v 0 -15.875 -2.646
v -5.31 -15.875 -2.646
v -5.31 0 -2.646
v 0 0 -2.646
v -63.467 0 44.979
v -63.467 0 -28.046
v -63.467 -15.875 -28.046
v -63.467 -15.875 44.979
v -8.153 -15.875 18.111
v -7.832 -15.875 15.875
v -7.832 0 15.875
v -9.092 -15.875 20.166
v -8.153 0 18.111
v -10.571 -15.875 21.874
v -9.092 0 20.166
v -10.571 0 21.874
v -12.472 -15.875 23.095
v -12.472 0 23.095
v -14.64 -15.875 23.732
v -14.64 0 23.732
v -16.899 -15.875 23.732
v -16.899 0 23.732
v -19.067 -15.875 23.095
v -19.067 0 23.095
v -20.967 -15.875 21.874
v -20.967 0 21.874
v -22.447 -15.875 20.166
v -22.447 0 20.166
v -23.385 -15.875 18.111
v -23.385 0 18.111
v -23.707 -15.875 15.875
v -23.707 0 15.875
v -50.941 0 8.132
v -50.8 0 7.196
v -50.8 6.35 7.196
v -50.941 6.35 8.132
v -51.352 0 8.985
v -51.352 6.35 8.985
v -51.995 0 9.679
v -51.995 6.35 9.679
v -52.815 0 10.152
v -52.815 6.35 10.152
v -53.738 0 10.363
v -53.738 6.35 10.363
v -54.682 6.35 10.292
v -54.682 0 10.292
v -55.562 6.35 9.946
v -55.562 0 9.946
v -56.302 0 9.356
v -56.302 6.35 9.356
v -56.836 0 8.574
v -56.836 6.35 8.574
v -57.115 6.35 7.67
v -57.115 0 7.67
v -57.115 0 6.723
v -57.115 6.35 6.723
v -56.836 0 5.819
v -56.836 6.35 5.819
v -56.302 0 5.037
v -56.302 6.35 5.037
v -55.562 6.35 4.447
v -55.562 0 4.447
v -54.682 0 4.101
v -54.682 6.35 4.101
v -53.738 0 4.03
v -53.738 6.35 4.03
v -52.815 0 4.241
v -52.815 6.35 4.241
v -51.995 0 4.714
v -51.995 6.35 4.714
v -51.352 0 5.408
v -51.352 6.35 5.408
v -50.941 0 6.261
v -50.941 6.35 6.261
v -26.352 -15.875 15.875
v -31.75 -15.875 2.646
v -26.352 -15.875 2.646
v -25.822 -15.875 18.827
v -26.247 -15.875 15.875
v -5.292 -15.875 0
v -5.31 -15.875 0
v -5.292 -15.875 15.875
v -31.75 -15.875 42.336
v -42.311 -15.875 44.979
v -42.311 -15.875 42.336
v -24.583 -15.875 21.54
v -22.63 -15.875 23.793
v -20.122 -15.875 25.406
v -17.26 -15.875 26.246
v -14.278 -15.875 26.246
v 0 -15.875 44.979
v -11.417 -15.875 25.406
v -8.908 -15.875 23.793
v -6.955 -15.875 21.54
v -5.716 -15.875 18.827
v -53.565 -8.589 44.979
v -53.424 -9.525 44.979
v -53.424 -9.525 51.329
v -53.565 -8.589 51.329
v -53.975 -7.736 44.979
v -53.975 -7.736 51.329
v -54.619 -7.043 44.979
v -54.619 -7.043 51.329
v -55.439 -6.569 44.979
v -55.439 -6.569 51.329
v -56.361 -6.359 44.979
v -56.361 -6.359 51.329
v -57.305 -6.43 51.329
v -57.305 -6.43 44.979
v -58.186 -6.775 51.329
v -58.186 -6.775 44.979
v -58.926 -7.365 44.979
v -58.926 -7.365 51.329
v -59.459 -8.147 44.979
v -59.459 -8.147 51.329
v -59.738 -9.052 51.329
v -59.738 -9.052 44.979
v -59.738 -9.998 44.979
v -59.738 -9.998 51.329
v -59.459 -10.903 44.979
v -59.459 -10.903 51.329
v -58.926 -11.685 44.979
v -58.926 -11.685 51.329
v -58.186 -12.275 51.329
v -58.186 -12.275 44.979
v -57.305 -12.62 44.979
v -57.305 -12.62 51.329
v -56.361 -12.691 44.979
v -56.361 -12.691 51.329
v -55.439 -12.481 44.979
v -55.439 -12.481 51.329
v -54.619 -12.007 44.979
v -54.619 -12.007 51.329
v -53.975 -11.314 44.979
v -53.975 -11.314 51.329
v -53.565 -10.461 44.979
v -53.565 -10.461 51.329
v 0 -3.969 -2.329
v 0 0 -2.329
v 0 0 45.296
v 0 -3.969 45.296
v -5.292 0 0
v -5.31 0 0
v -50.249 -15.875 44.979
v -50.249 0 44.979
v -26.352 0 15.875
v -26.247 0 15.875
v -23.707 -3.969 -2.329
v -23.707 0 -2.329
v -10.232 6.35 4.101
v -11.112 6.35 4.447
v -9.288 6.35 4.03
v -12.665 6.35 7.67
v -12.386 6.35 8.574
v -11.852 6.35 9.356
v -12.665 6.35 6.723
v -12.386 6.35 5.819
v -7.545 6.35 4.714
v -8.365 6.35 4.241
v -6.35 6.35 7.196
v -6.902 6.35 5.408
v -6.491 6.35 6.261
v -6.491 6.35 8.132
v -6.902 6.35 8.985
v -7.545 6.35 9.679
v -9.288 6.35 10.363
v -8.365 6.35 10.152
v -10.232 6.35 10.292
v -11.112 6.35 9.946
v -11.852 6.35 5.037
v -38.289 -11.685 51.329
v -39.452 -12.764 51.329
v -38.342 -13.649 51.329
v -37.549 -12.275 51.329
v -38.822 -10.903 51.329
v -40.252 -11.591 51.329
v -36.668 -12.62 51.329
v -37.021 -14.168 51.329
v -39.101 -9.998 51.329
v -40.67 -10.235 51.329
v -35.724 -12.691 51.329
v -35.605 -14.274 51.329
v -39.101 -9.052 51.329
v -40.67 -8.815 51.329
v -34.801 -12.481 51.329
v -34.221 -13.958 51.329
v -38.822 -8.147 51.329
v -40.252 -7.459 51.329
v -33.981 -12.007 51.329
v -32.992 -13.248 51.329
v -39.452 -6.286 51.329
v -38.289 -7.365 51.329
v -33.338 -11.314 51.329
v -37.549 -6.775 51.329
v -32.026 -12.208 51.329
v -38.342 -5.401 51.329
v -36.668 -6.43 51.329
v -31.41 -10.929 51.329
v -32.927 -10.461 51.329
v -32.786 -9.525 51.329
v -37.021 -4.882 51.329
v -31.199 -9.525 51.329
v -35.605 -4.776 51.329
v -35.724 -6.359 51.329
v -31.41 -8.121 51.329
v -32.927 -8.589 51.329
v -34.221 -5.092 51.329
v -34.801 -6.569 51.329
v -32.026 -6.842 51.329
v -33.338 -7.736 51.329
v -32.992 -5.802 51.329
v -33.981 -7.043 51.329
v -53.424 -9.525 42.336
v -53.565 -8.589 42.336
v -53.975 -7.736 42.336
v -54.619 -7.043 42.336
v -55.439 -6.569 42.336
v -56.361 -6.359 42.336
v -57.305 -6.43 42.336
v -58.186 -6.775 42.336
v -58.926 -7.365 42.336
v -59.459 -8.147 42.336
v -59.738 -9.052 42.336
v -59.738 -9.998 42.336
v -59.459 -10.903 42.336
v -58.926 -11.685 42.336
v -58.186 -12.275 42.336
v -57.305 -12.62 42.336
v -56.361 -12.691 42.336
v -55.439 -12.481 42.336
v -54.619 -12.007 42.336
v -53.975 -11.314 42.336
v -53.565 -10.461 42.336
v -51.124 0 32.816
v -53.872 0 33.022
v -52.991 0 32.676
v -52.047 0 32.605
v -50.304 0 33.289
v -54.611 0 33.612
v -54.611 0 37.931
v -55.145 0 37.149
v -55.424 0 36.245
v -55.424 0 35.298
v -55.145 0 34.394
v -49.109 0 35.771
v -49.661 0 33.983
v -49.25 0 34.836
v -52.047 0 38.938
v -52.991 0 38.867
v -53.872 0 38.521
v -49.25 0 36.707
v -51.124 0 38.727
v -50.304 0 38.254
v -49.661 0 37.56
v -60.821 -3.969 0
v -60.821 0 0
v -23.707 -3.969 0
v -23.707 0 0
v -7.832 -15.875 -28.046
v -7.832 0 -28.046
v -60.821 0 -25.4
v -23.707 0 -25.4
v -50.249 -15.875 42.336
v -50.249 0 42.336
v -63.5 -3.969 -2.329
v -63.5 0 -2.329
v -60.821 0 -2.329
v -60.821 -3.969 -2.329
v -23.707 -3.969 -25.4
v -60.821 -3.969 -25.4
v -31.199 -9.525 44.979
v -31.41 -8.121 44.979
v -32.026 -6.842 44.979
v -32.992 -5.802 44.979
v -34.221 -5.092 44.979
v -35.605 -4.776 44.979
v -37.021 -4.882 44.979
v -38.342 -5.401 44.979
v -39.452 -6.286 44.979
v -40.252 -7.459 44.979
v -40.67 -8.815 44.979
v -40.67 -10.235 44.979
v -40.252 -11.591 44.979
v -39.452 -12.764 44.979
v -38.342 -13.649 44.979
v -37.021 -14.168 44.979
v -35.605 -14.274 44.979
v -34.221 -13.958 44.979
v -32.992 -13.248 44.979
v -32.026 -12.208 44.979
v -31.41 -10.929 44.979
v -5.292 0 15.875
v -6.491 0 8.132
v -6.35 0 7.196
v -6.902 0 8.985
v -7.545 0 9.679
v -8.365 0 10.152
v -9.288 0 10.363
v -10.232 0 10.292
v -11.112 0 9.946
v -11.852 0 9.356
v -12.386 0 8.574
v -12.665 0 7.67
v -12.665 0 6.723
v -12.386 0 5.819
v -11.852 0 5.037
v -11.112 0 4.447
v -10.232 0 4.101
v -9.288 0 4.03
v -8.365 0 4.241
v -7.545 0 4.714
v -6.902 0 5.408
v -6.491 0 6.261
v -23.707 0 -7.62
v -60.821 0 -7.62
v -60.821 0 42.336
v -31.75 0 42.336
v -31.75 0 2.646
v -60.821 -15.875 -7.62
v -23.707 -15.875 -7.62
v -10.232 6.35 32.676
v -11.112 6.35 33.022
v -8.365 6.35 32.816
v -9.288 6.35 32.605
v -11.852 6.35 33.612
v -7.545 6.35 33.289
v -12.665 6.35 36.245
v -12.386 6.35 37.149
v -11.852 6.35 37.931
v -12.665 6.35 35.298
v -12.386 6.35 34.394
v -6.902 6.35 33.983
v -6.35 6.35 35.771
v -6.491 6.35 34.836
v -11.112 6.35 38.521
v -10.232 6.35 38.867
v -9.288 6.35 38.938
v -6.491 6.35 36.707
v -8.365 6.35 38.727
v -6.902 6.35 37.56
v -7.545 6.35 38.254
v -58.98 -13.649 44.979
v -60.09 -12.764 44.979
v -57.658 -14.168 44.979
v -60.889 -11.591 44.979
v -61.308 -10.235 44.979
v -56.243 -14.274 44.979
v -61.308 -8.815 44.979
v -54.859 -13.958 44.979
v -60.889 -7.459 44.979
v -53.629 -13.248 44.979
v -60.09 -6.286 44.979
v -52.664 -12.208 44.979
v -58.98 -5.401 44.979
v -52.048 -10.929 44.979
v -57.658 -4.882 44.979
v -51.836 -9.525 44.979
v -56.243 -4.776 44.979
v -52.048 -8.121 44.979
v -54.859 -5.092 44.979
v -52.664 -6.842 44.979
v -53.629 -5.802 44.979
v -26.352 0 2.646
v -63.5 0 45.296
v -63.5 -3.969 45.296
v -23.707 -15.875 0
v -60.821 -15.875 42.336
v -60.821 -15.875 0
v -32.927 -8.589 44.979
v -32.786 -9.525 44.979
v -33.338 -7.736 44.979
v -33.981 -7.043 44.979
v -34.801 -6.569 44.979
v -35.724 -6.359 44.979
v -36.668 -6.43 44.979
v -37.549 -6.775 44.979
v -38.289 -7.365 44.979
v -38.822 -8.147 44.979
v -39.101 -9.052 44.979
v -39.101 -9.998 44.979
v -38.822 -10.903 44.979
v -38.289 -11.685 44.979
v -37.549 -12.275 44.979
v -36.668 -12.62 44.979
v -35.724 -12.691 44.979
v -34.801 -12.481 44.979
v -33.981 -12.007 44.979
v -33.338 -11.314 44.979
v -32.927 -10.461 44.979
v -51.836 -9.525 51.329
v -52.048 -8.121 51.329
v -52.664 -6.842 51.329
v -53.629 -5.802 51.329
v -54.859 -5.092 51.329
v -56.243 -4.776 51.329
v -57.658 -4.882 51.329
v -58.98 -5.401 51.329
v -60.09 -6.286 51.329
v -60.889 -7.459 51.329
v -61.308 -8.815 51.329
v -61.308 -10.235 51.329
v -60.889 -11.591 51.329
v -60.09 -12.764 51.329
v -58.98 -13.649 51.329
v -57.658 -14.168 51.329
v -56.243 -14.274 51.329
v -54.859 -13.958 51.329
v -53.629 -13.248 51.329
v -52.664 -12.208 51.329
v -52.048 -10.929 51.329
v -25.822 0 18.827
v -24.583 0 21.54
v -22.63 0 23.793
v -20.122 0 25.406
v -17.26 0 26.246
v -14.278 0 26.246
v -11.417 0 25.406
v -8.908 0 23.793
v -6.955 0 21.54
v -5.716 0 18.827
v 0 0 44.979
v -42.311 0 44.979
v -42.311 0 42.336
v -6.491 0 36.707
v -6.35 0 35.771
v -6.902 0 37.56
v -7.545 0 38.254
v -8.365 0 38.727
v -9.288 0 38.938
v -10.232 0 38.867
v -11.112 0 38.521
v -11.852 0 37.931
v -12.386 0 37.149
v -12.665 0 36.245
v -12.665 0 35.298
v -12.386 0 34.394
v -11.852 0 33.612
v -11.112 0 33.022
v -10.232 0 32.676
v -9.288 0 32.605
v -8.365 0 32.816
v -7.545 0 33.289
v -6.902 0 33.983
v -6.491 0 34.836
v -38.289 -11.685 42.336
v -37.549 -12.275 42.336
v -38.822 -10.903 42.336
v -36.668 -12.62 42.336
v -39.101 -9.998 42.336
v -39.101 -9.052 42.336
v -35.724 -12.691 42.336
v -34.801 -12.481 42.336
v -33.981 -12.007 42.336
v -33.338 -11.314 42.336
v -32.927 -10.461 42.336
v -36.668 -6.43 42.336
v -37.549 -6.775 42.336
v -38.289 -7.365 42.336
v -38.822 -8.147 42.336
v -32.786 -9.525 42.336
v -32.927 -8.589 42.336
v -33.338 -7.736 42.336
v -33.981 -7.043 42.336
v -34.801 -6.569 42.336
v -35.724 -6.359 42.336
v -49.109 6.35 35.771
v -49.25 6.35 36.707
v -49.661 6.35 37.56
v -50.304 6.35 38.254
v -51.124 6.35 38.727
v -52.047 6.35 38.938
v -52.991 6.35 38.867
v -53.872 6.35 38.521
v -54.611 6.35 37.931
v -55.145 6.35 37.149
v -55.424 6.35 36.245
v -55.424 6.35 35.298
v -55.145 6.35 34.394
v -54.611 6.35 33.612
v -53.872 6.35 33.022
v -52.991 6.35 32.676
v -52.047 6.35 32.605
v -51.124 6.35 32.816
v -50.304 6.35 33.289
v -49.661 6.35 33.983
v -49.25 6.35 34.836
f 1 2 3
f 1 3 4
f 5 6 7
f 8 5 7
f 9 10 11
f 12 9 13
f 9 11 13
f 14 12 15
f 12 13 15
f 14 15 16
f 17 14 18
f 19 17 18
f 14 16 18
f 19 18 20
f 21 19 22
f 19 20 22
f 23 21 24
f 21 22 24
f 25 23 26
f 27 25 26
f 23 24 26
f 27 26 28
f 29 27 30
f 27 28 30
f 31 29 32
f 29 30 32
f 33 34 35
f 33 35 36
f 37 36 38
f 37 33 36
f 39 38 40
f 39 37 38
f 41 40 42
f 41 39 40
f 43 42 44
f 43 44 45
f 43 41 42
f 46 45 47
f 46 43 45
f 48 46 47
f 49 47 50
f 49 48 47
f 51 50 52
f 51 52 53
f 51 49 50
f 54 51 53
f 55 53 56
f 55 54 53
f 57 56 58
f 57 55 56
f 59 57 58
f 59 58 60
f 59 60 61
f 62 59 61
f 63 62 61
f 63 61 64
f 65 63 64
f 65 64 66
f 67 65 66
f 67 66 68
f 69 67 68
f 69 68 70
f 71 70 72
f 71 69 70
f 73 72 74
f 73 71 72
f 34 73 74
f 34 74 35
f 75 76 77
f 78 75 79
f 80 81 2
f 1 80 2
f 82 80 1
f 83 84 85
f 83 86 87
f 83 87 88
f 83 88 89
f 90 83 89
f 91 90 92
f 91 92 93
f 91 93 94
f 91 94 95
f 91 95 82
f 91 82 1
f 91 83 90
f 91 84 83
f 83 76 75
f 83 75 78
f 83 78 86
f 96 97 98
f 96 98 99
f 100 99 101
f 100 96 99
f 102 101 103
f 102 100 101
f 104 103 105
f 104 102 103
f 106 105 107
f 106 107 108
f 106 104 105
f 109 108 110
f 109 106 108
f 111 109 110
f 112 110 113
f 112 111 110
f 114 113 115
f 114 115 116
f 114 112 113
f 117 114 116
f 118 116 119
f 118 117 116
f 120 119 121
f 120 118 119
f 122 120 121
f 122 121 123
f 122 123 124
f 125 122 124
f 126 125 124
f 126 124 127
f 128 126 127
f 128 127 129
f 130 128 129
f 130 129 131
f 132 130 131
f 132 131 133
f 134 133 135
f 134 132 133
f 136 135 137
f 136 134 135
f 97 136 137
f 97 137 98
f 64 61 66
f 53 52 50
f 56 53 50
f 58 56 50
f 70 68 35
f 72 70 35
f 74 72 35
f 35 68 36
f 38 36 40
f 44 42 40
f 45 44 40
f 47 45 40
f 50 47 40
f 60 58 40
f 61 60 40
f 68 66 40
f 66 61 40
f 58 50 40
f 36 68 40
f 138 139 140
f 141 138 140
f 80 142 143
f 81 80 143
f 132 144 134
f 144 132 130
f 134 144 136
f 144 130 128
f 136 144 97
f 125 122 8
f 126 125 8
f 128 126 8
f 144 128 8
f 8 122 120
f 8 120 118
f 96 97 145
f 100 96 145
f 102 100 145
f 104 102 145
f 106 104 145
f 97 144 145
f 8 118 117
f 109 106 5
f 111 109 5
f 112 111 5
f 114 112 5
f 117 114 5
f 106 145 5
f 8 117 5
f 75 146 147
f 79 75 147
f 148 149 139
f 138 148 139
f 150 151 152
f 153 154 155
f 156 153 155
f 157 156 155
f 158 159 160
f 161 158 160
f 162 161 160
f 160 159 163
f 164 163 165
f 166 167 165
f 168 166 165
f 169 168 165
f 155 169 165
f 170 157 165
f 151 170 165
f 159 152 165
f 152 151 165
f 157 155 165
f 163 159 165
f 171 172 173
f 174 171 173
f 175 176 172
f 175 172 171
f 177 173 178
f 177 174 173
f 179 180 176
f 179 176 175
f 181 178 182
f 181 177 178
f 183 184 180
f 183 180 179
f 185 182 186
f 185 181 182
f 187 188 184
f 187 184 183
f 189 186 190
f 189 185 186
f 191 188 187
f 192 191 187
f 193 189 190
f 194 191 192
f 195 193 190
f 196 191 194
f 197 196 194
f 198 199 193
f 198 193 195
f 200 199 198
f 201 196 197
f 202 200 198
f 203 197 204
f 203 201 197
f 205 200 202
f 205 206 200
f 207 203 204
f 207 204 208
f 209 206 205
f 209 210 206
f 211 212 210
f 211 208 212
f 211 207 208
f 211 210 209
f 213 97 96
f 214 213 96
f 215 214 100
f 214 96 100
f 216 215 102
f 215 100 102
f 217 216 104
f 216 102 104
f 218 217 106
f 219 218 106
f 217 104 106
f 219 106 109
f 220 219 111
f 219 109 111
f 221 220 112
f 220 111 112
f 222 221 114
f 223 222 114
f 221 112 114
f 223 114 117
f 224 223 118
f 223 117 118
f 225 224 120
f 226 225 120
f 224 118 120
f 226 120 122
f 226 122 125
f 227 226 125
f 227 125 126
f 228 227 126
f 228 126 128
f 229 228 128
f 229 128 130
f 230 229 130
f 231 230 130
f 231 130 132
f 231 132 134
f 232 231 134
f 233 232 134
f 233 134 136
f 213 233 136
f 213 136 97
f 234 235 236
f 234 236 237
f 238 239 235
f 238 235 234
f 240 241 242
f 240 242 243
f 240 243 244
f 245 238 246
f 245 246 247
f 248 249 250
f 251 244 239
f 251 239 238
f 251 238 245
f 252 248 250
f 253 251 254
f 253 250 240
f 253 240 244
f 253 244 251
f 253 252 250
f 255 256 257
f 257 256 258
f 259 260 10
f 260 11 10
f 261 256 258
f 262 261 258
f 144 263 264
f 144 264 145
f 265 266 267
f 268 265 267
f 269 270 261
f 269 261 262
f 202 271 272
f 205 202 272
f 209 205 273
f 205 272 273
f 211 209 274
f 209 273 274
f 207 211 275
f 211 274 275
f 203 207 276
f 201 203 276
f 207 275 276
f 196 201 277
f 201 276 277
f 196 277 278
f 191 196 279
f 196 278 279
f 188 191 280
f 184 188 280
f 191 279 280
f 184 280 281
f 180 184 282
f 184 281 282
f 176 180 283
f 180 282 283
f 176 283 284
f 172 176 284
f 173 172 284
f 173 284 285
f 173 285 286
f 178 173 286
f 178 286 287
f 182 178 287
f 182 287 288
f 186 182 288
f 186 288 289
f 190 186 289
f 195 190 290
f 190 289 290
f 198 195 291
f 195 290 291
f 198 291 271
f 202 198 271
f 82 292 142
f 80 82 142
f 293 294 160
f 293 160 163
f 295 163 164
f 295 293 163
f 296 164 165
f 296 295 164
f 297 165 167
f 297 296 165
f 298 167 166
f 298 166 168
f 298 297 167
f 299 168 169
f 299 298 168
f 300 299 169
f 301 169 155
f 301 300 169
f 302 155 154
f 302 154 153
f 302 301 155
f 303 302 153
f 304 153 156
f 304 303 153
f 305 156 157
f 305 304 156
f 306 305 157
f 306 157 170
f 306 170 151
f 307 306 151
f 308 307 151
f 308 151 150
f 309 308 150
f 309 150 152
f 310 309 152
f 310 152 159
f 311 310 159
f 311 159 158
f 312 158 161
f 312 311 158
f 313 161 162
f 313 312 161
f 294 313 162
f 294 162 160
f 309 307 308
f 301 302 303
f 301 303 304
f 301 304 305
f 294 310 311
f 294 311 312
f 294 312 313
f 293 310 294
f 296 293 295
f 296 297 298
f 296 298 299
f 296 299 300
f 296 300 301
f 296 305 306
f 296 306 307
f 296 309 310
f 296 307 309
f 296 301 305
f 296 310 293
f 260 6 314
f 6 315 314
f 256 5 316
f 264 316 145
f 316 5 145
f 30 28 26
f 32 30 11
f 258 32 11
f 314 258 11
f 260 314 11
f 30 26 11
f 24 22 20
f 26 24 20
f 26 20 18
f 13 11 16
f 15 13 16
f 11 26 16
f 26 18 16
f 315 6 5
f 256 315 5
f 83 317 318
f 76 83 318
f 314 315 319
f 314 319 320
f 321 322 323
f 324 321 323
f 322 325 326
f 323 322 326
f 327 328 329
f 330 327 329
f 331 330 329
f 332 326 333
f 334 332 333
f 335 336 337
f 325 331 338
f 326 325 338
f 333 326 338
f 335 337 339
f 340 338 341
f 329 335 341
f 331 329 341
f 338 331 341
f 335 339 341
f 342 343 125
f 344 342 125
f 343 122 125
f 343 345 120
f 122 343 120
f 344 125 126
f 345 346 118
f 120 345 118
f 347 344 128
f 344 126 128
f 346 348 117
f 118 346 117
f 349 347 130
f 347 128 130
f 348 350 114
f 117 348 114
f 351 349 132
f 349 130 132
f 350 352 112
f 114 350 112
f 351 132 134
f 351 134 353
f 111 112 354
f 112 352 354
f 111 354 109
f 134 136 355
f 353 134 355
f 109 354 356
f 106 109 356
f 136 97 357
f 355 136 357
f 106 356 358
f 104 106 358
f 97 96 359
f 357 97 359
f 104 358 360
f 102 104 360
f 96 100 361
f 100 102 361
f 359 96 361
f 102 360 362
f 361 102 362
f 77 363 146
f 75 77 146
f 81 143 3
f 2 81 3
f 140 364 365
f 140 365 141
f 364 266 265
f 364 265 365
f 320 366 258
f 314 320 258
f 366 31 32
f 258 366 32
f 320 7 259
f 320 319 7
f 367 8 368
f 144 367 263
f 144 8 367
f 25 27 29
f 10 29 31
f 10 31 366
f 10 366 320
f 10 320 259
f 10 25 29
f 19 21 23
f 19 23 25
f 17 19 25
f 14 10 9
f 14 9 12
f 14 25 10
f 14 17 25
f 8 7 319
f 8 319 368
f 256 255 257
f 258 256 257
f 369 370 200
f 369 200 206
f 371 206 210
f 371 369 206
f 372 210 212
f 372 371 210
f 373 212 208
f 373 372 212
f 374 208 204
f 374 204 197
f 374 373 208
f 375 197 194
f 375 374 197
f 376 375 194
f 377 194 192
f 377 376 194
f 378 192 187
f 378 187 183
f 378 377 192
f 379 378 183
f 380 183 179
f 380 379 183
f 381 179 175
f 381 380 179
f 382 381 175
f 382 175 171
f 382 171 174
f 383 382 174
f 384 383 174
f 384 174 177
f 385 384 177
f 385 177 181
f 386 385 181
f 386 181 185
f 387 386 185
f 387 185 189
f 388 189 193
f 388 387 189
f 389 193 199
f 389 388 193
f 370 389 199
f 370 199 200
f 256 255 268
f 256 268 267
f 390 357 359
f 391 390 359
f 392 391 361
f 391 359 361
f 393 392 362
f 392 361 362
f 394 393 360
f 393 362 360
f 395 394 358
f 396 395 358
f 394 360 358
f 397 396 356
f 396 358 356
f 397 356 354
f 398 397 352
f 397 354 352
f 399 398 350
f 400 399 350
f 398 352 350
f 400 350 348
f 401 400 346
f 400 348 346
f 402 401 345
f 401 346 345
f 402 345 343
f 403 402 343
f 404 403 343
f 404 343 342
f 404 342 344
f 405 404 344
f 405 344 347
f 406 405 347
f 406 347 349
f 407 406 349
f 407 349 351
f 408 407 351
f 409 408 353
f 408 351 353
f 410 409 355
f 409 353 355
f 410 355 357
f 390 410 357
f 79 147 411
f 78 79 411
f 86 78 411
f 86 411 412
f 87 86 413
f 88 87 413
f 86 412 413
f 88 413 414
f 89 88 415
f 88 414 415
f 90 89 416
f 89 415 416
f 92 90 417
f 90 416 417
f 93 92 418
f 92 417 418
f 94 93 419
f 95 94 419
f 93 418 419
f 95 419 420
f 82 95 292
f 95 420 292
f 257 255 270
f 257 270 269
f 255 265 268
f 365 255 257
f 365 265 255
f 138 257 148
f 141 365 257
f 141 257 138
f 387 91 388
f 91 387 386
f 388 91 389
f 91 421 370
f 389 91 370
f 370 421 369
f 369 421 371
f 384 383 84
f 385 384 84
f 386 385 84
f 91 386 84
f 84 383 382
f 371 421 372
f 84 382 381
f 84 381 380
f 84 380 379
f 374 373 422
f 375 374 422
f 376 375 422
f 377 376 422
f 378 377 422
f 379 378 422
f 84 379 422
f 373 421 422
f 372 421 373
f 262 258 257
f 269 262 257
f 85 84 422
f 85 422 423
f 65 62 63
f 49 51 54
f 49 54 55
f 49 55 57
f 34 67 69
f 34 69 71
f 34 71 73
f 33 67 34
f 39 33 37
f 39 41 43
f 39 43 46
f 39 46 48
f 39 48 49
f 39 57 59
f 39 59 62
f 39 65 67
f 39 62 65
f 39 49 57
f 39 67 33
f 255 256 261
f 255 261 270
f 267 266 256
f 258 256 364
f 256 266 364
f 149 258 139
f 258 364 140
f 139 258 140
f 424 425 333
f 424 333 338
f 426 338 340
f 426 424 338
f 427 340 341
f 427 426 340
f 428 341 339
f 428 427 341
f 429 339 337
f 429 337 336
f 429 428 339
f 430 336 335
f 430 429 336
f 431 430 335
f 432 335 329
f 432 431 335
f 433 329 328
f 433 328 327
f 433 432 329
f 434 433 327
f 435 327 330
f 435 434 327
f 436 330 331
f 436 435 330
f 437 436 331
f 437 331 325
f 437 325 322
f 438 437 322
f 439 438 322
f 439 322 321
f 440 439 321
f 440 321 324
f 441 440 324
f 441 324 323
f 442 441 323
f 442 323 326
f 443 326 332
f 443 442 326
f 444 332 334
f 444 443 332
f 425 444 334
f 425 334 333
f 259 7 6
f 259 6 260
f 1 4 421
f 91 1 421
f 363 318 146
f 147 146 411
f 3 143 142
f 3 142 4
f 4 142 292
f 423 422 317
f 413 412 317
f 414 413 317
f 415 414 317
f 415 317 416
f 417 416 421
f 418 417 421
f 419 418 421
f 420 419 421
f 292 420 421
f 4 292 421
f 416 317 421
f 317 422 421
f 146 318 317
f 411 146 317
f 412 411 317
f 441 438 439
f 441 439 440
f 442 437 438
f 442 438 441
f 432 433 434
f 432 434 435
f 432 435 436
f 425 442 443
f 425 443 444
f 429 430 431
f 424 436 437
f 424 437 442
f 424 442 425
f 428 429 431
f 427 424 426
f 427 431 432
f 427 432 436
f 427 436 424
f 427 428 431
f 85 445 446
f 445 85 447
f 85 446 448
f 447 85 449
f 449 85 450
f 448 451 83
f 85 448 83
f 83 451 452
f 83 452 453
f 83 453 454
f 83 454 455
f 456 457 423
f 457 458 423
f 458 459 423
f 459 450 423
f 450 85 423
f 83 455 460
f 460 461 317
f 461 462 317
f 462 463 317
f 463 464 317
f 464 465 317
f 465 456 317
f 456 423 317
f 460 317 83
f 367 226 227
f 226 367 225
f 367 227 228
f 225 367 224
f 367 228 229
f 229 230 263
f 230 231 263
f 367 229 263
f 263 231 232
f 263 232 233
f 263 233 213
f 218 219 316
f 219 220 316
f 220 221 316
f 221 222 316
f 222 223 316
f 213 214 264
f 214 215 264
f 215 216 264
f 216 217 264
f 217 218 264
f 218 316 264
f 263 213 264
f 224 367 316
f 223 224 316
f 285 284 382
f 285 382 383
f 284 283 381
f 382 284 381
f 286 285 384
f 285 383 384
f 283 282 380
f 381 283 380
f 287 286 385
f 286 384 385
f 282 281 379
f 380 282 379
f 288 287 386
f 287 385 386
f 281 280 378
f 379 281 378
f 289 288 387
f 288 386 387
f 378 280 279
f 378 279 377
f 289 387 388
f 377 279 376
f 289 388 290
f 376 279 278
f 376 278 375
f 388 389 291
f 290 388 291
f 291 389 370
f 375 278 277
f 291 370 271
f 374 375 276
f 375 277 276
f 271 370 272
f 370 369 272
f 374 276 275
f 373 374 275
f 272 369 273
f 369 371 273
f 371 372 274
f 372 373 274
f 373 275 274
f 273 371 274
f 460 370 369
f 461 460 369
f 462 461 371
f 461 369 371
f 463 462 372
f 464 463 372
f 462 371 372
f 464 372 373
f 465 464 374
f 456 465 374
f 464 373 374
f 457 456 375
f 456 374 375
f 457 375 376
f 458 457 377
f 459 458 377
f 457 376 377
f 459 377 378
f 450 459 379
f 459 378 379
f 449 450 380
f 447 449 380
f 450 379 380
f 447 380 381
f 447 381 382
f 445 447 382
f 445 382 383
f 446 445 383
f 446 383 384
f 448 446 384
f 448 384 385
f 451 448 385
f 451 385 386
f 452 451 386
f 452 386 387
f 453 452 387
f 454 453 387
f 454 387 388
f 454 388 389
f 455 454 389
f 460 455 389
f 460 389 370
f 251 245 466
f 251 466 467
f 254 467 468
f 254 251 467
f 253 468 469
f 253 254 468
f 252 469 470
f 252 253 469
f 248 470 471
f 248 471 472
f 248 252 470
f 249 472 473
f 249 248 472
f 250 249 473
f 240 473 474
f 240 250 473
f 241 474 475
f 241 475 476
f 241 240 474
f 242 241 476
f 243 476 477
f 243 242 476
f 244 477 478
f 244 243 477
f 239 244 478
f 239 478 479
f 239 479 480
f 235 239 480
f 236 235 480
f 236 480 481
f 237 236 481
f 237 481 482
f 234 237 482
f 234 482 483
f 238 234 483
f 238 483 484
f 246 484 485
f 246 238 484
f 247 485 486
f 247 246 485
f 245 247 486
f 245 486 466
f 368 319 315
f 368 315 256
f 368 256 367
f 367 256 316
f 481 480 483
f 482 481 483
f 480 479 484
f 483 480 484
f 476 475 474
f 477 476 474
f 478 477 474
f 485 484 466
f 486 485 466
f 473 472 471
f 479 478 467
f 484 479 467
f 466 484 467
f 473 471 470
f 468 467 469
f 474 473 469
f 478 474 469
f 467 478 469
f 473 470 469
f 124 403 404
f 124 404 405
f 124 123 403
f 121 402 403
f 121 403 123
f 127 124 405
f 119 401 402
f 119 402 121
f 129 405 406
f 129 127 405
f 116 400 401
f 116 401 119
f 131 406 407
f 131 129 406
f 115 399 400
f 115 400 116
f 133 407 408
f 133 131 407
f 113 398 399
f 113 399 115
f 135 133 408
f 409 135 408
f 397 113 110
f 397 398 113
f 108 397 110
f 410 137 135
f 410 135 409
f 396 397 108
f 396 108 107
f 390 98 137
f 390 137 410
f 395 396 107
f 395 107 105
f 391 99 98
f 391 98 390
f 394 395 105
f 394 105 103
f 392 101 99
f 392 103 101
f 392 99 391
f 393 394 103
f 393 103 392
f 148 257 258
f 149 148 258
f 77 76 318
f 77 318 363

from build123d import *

# Parameters (mm, degrees)
F1_DEPTH  = 15.875
F0_W      = 2.6458333332
F0_H      = 42.3358732487
F2_W      = 63.5
F2_H      = 47.625
F2_R      = 3.175
F3_DEPTH  = 3.96875
F4_DEPTH  = 6.35
F5_R      = 4.7625
F5_R_2    = 3.175
F6_DEPTH  = 6.35
F7_R      = 3.175
F8_DEPTH  = 25.4
F9_W      = 55.6354932006
F9_H      = 15.875
F10_DEPTH = 25.4
F11_W     = 37.1146598675
F11_H     = 15.875
F12_DEPTH = 7.62
F13_W     = 37.1146598675
F13_H     = 3.96875
F14_DEPTH = 25.4


# Not quite as in the source:
# - a feature names something its author has since deleted; it is built from what else it names


with BuildPart() as f1:
    # F0 (on Front) → F1 (new body)
    with BuildSketch(Plane.XZ):
        with BuildLine():
            Line((0, 44.979166582), (-31.75, 44.979166582))
            Line((-31.75, 44.979166582), (-31.75, 42.3358732487))
            Line((-31.75, 42.3358732487), (-31.75, 2.6458333332))
            Line((-31.75, 2.6458333332), (-26.3525, 2.6458333332))
            Line((-26.3525, 2.6458333332), (-26.3525, 15.875))
            Line((-26.3525, 15.875), (-26.2466666667, 15.875))
            ThreePointArc((-26.2466666667, 15.875), (-15.7691666667, 26.3525), (-5.2916666667, 15.875))
            Line((-5.2916666667, 15.875), (-5.2916666667, 0))
            Line((-5.2916666667, 0), (0, 0))
            Line((0, 0), (0, 44.979166582))
        make_face()
        Polygon((0, -2.6458333333), (0, 0), (-5.2916666667, 0), (-5.309548229, 0), (-5.309548229, -2.6458333333), align=None)
        Polygon((-31.75, 42.3358732487), (-31.75, 44.979166582), (-34.3958333316, 44.979166582), (-37.0416664956, 44.979166582), (-42.3110765377, 44.979166582), (-42.3110765377, 42.3358732487), (-37.0416664956, 42.3358732487), (-34.3958333316, 42.3358732487), align=None)
    extrude(amount=F1_DEPTH)


with BuildPart() as f1b:
    # F0 (on Front) → F1, piece 2 (new body)
    with BuildSketch(Plane.XZ):
        with BuildLine():
            Line((-23.7066666667, 0), (-7.8316666667, 0))
            Line((-7.8316666667, 0), (-7.8316666667, 15.875))
            ThreePointArc((-7.8316666667, 15.875), (-15.7691666667, 23.8125), (-23.7066666667, 15.875))
            Line((-23.7066666667, 15.875), (-23.7066666667, 0))
        make_face()
        Polygon((-26.3525, 0), (-31.75, 0), (-60.8213265341, 0), (-63.4671598673, 0), (-63.4671598673, -2.6458333333), (-7.8316666667, -2.6458333333), (-7.8316666667, 0), (-23.7066666667, 0), align=None)
        with Locations((-62.1442432007, 21.1679366243)):
            Rectangle(F0_W, F0_H)
        Polygon((-50.2485765377, 42.3358732487), (-50.2485765377, 44.979166582), (-55.5296598693, 44.979166582), (-58.175493201, 44.979166582), (-63.4671598673, 44.979166582), (-63.4671598673, 42.3358732487), (-60.8213265341, 42.3358732487), (-58.175493201, 42.3358732487), (-55.5296598693, 42.3358732487), align=None)
    extrude(amount=F1_DEPTH)


with BuildPart() as f3:
    # F2 (on Front) → F3 (new body)
    with BuildSketch(Plane.XZ):
        with Locations((-31.75, 21.4839725468)):
            Rectangle(F2_W, F2_H)
        with Locations((-53.975, 7.1964725468)):
            Circle(F2_R, mode=Mode.SUBTRACT)
        with Locations((-9.525, 7.1964725468)):
            Circle(F2_R, mode=Mode.SUBTRACT)
        with Locations((-52.284011212, 35.7714725468)):
            Circle(F2_R, mode=Mode.SUBTRACT)
        with Locations((-9.525, 35.7714725468)):
            Circle(F2_R, mode=Mode.SUBTRACT)
        with Locations((-52.284011212, 35.7714725468)):
            Circle(F2_R)
        with Locations((-53.975, 7.1964725468)):
            Circle(F2_R)
        with Locations((-9.525, 7.1964725468)):
            Circle(F2_R)
        with Locations((-9.525, 35.7714725468)):
            Circle(F2_R)
    extrude(amount=F3_DEPTH)


with BuildPart() as f4:
    # F2 (on Front) → F4 (new body)
    with BuildSketch(Plane.XZ):
        with Locations((-9.525, 35.7714725468)):
            Circle(F2_R)
    extrude(amount=-F4_DEPTH)


with BuildPart() as f4b:
    # F2 (on Front) → F4, piece 2 (new body)
    with BuildSketch(Plane.XZ):
        with Locations((-52.284011212, 35.7714725468)):
            Circle(F2_R)
    extrude(amount=-F4_DEPTH)


with BuildPart() as f4c:
    # F2 (on Front) → F4, piece 3 (new body)
    with BuildSketch(Plane.XZ):
        with Locations((-9.525, 7.1964725468)):
            Circle(F2_R)
    extrude(amount=-F4_DEPTH)


with BuildPart() as f4d:
    # F2 (on Front) → F4, piece 4 (new body)
    with BuildSketch(Plane.XZ):
        with Locations((-53.975, 7.1964725468)):
            Circle(F2_R)
    extrude(amount=-F4_DEPTH)


with BuildPart() as f6:
    # F5 (on face) → F6 (new body)
    with BuildSketch(Plane.XY.offset(44.979166582)):
        with Locations((-56.5985765377, -9.525)):
            Circle(F5_R)
        with Locations((-56.5985765377, -9.525)):
            Circle(F5_R_2, mode=Mode.SUBTRACT)
    extrude(amount=F6_DEPTH)


with BuildPart() as f6b:
    # F5 (on face) → F6, piece 2 (new body)
    with BuildSketch(Plane.XY.offset(44.979166582)):
        with Locations((-35.9610765377, -9.525)):
            Circle(F5_R)
        with Locations((-35.9610765377, -9.525)):
            Circle(F5_R_2, mode=Mode.SUBTRACT)
    extrude(amount=F6_DEPTH)


with BuildPart() as f8_tool:
    # F7 (on face) → F8 (new body)
    with BuildSketch(Plane.XY.offset(44.979166582)):
        with Locations((-35.9610765377, -9.525)):
            Circle(F7_R)
        with Locations((-56.5985765377, -9.525)):
            Circle(F7_R)
    extrude(amount=-F8_DEPTH)


with BuildPart() as f1_1:
    add(f1.part)

    # F8: cut by f8_tool
    add(f8_tool.part, mode=Mode.SUBTRACT)


with BuildPart() as f1b_1:
    add(f1b.part)

    # F8: cut by f8_tool
    add(f8_tool.part, mode=Mode.SUBTRACT)

    # F9 (on face) → F10 (join)
    with BuildSketch(Plane(origin=(0, 0, -2.6458333333), x_dir=(1, 0, 0), z_dir=(0, 0, -1))):
        with Locations((-35.649413267, 7.9375)):
            Rectangle(F9_W, F9_H)
    extrude(amount=F10_DEPTH)


with BuildPart() as f12_tool:
    # F11 (on face) → F12 (new body)
    with BuildSketch(Plane.XY):
        with Locations((-42.2639966004, -7.9375)):
            Rectangle(F11_W, F11_H)
    extrude(amount=-F12_DEPTH)


with BuildPart() as f1b_2:
    add(f1b_1.part)

    # F12: cut by f12_tool
    add(f12_tool.part, mode=Mode.SUBTRACT)


with BuildPart() as f3_1:
    add(f3.part)

    # F12: cut by f12_tool
    add(f12_tool.part, mode=Mode.SUBTRACT)


with BuildPart() as f14:
    # F13 (on face) → F14 (new body)
    with BuildSketch(Plane(origin=(0, 0, 0), x_dir=(1, 0, 0), z_dir=(0, 0, -1))):
        with Locations((-42.2639966004, 1.984375)):
            Rectangle(F13_W, F13_H)
    extrude(amount=F14_DEPTH)


solid = Compound([f4.part, f4b.part, f4c.part, f4d.part, f6.part, f6b.part, f1_1.part, f1b_2.part, f3_1.part, f14.part])
